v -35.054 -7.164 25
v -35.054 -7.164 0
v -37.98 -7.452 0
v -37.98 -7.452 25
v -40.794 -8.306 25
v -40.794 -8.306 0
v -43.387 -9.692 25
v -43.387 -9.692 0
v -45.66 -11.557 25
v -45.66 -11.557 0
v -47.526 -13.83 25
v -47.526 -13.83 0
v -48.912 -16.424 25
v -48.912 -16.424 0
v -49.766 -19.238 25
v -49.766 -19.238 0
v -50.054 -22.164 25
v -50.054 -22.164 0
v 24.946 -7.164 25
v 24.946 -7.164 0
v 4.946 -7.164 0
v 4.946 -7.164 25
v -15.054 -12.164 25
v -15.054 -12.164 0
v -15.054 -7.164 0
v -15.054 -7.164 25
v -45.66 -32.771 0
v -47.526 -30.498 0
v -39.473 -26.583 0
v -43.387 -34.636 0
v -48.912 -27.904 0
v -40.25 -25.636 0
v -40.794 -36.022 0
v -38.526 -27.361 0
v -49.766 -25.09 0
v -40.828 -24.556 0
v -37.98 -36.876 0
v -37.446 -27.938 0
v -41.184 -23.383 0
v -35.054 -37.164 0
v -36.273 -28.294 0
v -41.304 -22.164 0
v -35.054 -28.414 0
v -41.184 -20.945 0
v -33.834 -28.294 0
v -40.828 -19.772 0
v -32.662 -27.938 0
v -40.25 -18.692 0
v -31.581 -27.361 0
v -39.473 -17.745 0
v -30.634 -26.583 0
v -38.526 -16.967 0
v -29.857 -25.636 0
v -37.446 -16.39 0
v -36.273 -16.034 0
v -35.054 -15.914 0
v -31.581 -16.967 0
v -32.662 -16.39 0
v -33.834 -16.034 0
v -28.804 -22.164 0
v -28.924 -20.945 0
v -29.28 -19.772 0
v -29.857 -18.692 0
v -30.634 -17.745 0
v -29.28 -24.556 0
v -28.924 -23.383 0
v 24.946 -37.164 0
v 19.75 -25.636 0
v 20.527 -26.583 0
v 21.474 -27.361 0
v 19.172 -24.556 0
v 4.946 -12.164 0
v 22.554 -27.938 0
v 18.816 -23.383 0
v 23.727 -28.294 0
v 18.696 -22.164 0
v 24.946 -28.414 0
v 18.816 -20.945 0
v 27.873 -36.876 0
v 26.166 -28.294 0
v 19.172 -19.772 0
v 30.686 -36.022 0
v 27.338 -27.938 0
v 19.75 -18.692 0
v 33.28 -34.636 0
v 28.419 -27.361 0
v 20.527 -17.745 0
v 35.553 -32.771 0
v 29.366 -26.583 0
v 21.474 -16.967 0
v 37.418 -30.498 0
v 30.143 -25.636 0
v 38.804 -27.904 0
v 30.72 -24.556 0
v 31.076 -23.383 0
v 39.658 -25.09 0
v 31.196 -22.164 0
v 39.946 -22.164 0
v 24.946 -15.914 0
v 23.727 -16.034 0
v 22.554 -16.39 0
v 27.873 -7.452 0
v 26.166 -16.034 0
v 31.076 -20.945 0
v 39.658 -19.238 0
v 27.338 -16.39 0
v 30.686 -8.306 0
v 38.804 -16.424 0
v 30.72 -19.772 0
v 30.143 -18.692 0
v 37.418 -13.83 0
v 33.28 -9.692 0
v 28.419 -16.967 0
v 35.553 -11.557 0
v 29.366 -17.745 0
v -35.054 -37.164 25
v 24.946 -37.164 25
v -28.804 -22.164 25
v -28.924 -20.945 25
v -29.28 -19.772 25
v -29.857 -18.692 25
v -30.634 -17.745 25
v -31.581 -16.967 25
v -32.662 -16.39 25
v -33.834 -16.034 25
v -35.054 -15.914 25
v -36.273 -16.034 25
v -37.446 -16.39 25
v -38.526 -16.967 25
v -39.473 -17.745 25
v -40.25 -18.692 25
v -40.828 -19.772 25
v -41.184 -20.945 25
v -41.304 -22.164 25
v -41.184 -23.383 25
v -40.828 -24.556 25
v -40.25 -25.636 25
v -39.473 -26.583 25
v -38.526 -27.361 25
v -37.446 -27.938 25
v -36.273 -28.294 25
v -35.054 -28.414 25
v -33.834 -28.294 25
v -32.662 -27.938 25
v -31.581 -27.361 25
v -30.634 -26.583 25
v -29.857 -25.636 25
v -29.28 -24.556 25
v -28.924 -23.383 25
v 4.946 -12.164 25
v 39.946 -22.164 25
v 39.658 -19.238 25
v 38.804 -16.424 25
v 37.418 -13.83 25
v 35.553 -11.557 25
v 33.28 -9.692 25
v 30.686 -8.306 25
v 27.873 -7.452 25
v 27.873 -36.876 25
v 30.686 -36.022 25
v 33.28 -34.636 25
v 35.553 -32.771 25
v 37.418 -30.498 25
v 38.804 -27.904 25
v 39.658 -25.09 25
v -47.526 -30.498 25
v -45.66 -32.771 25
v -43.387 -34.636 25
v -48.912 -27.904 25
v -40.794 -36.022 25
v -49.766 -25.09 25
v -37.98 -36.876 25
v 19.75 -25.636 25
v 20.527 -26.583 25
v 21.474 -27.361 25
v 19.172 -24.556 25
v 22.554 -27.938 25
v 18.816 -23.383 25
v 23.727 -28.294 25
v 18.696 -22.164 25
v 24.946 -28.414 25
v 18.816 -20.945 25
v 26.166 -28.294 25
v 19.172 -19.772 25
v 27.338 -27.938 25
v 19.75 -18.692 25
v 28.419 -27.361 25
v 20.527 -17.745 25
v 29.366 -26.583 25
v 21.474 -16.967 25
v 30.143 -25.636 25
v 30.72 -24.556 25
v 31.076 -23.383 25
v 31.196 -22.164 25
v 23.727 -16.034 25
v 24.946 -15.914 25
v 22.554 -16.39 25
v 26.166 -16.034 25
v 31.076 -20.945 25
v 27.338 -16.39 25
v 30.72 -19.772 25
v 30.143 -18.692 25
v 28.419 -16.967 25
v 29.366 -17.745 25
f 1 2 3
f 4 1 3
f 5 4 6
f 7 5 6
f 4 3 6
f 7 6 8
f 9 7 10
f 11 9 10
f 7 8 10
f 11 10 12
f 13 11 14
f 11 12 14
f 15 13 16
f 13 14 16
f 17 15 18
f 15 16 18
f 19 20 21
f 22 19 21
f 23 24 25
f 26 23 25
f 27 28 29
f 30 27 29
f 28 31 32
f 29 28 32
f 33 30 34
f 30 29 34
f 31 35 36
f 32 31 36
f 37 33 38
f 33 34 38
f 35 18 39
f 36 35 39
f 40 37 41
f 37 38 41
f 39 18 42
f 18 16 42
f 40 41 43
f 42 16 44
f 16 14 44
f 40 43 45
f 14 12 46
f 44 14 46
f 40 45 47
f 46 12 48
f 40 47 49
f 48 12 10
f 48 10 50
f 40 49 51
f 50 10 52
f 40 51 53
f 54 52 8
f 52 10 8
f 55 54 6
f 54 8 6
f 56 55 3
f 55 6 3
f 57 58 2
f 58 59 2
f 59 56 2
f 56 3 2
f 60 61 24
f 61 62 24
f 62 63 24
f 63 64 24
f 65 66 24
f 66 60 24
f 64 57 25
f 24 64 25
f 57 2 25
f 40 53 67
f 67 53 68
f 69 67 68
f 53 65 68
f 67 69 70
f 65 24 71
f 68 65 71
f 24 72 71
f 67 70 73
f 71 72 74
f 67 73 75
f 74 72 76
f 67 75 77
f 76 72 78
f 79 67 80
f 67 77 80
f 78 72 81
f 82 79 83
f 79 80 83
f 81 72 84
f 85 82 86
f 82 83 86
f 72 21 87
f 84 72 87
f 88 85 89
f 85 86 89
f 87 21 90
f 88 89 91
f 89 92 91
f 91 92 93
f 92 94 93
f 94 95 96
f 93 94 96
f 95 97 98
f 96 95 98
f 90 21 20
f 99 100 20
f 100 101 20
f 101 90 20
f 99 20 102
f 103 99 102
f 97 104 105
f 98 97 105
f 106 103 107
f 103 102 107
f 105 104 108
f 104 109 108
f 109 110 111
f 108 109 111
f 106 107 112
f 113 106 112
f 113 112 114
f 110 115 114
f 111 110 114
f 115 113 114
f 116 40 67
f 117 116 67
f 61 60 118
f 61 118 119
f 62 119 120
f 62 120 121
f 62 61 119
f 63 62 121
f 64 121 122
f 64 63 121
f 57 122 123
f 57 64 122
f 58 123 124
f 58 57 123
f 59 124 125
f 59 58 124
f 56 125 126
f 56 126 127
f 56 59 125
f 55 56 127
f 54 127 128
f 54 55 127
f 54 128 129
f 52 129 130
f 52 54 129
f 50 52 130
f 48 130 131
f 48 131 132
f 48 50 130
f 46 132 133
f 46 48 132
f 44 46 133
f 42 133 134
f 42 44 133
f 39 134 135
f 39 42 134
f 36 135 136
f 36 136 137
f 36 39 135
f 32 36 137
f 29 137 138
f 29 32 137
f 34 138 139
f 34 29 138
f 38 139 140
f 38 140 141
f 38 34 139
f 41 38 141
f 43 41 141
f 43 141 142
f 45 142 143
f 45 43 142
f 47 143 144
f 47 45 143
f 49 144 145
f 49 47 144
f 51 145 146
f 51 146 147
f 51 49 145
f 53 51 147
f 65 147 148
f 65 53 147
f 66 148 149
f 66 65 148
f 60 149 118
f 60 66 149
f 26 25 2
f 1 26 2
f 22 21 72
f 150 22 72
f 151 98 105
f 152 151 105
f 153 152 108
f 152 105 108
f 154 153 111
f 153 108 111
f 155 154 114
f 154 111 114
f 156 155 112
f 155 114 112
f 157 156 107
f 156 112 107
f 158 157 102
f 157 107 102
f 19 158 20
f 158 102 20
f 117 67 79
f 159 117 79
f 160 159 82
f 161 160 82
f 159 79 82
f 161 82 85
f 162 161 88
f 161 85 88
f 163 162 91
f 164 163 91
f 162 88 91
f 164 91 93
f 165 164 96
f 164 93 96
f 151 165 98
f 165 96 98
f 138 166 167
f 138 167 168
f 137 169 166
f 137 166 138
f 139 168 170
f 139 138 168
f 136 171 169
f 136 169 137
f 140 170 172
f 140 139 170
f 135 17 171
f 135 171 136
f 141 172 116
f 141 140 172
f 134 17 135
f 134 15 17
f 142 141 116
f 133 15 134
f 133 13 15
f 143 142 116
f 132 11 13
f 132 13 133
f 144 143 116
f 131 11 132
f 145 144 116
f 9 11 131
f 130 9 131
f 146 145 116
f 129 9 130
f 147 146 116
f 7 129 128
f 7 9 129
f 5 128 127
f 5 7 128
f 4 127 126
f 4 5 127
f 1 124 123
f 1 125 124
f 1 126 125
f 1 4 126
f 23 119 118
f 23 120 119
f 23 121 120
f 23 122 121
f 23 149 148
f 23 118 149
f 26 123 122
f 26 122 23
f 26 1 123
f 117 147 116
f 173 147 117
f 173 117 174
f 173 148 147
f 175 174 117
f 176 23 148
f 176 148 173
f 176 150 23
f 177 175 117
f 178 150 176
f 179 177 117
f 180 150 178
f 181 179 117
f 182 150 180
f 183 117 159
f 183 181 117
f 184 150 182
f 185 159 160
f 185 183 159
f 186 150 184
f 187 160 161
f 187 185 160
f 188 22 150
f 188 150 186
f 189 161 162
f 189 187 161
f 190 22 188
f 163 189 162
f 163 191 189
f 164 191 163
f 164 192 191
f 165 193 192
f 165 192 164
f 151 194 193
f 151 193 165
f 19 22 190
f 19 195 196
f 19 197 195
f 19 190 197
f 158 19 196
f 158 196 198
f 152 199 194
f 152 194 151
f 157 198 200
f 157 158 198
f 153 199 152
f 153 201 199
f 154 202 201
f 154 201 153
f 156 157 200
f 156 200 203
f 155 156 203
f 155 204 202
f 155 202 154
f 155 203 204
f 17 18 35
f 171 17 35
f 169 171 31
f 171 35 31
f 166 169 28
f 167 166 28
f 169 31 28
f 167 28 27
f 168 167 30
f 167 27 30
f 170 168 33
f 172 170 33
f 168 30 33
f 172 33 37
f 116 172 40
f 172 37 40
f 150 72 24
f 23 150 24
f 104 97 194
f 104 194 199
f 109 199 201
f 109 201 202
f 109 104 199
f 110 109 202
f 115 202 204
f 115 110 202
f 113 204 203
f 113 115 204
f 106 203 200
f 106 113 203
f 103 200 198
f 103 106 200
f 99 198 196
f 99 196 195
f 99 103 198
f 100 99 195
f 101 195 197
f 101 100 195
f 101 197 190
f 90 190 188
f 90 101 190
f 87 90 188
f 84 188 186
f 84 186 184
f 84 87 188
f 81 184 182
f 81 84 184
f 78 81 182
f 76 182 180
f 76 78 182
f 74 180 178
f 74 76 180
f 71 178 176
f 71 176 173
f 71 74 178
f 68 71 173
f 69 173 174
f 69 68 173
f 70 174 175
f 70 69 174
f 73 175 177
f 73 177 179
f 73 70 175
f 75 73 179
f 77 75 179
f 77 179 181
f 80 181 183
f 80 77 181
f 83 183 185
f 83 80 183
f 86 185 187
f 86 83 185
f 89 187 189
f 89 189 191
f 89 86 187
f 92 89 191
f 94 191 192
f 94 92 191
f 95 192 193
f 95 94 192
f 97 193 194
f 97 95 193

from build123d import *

# Parameters (mm, degrees)
F0_R     = 6.25
F1_DEPTH = 25


with BuildPart() as f1:
    # F0 (on Top) → F1 (new body)
    with BuildSketch(Plane.XY):
        with BuildLine():
            ThreePointArc((-50.053764, -22.16398), (-45.660366, -32.770582), (-35.053764, -37.16398))
            Line((-35.053764, -37.16398), (24.946236, -37.16398))
            ThreePointArc((24.946236, -37.16398), (35.552838, -32.770582), (39.946236, -22.16398))
            ThreePointArc((39.946236, -22.16398), (35.552838, -11.557379), (24.946236, -7.16398))
            Line((24.946236, -7.16398), (4.946236, -7.16398))
            Line((4.946236, -7.16398), (4.946236, -12.16398))
            Line((4.946236, -12.16398), (-15.053764, -12.16398))
            Line((-15.053764, -12.16398), (-15.053764, -7.16398))
            Line((-15.053764, -7.16398), (-35.053764, -7.16398))
            ThreePointArc((-35.053764, -7.16398), (-45.660366, -11.557379), (-50.053764, -22.16398))
        make_face()
        with Locations((-35.053764, -22.16398)):
            Circle(F0_R, mode=Mode.SUBTRACT)
        with Locations((24.946236, -22.16398)):
            Circle(F0_R, mode=Mode.SUBTRACT)
    extrude(amount=F1_DEPTH)


solid = f1.part
